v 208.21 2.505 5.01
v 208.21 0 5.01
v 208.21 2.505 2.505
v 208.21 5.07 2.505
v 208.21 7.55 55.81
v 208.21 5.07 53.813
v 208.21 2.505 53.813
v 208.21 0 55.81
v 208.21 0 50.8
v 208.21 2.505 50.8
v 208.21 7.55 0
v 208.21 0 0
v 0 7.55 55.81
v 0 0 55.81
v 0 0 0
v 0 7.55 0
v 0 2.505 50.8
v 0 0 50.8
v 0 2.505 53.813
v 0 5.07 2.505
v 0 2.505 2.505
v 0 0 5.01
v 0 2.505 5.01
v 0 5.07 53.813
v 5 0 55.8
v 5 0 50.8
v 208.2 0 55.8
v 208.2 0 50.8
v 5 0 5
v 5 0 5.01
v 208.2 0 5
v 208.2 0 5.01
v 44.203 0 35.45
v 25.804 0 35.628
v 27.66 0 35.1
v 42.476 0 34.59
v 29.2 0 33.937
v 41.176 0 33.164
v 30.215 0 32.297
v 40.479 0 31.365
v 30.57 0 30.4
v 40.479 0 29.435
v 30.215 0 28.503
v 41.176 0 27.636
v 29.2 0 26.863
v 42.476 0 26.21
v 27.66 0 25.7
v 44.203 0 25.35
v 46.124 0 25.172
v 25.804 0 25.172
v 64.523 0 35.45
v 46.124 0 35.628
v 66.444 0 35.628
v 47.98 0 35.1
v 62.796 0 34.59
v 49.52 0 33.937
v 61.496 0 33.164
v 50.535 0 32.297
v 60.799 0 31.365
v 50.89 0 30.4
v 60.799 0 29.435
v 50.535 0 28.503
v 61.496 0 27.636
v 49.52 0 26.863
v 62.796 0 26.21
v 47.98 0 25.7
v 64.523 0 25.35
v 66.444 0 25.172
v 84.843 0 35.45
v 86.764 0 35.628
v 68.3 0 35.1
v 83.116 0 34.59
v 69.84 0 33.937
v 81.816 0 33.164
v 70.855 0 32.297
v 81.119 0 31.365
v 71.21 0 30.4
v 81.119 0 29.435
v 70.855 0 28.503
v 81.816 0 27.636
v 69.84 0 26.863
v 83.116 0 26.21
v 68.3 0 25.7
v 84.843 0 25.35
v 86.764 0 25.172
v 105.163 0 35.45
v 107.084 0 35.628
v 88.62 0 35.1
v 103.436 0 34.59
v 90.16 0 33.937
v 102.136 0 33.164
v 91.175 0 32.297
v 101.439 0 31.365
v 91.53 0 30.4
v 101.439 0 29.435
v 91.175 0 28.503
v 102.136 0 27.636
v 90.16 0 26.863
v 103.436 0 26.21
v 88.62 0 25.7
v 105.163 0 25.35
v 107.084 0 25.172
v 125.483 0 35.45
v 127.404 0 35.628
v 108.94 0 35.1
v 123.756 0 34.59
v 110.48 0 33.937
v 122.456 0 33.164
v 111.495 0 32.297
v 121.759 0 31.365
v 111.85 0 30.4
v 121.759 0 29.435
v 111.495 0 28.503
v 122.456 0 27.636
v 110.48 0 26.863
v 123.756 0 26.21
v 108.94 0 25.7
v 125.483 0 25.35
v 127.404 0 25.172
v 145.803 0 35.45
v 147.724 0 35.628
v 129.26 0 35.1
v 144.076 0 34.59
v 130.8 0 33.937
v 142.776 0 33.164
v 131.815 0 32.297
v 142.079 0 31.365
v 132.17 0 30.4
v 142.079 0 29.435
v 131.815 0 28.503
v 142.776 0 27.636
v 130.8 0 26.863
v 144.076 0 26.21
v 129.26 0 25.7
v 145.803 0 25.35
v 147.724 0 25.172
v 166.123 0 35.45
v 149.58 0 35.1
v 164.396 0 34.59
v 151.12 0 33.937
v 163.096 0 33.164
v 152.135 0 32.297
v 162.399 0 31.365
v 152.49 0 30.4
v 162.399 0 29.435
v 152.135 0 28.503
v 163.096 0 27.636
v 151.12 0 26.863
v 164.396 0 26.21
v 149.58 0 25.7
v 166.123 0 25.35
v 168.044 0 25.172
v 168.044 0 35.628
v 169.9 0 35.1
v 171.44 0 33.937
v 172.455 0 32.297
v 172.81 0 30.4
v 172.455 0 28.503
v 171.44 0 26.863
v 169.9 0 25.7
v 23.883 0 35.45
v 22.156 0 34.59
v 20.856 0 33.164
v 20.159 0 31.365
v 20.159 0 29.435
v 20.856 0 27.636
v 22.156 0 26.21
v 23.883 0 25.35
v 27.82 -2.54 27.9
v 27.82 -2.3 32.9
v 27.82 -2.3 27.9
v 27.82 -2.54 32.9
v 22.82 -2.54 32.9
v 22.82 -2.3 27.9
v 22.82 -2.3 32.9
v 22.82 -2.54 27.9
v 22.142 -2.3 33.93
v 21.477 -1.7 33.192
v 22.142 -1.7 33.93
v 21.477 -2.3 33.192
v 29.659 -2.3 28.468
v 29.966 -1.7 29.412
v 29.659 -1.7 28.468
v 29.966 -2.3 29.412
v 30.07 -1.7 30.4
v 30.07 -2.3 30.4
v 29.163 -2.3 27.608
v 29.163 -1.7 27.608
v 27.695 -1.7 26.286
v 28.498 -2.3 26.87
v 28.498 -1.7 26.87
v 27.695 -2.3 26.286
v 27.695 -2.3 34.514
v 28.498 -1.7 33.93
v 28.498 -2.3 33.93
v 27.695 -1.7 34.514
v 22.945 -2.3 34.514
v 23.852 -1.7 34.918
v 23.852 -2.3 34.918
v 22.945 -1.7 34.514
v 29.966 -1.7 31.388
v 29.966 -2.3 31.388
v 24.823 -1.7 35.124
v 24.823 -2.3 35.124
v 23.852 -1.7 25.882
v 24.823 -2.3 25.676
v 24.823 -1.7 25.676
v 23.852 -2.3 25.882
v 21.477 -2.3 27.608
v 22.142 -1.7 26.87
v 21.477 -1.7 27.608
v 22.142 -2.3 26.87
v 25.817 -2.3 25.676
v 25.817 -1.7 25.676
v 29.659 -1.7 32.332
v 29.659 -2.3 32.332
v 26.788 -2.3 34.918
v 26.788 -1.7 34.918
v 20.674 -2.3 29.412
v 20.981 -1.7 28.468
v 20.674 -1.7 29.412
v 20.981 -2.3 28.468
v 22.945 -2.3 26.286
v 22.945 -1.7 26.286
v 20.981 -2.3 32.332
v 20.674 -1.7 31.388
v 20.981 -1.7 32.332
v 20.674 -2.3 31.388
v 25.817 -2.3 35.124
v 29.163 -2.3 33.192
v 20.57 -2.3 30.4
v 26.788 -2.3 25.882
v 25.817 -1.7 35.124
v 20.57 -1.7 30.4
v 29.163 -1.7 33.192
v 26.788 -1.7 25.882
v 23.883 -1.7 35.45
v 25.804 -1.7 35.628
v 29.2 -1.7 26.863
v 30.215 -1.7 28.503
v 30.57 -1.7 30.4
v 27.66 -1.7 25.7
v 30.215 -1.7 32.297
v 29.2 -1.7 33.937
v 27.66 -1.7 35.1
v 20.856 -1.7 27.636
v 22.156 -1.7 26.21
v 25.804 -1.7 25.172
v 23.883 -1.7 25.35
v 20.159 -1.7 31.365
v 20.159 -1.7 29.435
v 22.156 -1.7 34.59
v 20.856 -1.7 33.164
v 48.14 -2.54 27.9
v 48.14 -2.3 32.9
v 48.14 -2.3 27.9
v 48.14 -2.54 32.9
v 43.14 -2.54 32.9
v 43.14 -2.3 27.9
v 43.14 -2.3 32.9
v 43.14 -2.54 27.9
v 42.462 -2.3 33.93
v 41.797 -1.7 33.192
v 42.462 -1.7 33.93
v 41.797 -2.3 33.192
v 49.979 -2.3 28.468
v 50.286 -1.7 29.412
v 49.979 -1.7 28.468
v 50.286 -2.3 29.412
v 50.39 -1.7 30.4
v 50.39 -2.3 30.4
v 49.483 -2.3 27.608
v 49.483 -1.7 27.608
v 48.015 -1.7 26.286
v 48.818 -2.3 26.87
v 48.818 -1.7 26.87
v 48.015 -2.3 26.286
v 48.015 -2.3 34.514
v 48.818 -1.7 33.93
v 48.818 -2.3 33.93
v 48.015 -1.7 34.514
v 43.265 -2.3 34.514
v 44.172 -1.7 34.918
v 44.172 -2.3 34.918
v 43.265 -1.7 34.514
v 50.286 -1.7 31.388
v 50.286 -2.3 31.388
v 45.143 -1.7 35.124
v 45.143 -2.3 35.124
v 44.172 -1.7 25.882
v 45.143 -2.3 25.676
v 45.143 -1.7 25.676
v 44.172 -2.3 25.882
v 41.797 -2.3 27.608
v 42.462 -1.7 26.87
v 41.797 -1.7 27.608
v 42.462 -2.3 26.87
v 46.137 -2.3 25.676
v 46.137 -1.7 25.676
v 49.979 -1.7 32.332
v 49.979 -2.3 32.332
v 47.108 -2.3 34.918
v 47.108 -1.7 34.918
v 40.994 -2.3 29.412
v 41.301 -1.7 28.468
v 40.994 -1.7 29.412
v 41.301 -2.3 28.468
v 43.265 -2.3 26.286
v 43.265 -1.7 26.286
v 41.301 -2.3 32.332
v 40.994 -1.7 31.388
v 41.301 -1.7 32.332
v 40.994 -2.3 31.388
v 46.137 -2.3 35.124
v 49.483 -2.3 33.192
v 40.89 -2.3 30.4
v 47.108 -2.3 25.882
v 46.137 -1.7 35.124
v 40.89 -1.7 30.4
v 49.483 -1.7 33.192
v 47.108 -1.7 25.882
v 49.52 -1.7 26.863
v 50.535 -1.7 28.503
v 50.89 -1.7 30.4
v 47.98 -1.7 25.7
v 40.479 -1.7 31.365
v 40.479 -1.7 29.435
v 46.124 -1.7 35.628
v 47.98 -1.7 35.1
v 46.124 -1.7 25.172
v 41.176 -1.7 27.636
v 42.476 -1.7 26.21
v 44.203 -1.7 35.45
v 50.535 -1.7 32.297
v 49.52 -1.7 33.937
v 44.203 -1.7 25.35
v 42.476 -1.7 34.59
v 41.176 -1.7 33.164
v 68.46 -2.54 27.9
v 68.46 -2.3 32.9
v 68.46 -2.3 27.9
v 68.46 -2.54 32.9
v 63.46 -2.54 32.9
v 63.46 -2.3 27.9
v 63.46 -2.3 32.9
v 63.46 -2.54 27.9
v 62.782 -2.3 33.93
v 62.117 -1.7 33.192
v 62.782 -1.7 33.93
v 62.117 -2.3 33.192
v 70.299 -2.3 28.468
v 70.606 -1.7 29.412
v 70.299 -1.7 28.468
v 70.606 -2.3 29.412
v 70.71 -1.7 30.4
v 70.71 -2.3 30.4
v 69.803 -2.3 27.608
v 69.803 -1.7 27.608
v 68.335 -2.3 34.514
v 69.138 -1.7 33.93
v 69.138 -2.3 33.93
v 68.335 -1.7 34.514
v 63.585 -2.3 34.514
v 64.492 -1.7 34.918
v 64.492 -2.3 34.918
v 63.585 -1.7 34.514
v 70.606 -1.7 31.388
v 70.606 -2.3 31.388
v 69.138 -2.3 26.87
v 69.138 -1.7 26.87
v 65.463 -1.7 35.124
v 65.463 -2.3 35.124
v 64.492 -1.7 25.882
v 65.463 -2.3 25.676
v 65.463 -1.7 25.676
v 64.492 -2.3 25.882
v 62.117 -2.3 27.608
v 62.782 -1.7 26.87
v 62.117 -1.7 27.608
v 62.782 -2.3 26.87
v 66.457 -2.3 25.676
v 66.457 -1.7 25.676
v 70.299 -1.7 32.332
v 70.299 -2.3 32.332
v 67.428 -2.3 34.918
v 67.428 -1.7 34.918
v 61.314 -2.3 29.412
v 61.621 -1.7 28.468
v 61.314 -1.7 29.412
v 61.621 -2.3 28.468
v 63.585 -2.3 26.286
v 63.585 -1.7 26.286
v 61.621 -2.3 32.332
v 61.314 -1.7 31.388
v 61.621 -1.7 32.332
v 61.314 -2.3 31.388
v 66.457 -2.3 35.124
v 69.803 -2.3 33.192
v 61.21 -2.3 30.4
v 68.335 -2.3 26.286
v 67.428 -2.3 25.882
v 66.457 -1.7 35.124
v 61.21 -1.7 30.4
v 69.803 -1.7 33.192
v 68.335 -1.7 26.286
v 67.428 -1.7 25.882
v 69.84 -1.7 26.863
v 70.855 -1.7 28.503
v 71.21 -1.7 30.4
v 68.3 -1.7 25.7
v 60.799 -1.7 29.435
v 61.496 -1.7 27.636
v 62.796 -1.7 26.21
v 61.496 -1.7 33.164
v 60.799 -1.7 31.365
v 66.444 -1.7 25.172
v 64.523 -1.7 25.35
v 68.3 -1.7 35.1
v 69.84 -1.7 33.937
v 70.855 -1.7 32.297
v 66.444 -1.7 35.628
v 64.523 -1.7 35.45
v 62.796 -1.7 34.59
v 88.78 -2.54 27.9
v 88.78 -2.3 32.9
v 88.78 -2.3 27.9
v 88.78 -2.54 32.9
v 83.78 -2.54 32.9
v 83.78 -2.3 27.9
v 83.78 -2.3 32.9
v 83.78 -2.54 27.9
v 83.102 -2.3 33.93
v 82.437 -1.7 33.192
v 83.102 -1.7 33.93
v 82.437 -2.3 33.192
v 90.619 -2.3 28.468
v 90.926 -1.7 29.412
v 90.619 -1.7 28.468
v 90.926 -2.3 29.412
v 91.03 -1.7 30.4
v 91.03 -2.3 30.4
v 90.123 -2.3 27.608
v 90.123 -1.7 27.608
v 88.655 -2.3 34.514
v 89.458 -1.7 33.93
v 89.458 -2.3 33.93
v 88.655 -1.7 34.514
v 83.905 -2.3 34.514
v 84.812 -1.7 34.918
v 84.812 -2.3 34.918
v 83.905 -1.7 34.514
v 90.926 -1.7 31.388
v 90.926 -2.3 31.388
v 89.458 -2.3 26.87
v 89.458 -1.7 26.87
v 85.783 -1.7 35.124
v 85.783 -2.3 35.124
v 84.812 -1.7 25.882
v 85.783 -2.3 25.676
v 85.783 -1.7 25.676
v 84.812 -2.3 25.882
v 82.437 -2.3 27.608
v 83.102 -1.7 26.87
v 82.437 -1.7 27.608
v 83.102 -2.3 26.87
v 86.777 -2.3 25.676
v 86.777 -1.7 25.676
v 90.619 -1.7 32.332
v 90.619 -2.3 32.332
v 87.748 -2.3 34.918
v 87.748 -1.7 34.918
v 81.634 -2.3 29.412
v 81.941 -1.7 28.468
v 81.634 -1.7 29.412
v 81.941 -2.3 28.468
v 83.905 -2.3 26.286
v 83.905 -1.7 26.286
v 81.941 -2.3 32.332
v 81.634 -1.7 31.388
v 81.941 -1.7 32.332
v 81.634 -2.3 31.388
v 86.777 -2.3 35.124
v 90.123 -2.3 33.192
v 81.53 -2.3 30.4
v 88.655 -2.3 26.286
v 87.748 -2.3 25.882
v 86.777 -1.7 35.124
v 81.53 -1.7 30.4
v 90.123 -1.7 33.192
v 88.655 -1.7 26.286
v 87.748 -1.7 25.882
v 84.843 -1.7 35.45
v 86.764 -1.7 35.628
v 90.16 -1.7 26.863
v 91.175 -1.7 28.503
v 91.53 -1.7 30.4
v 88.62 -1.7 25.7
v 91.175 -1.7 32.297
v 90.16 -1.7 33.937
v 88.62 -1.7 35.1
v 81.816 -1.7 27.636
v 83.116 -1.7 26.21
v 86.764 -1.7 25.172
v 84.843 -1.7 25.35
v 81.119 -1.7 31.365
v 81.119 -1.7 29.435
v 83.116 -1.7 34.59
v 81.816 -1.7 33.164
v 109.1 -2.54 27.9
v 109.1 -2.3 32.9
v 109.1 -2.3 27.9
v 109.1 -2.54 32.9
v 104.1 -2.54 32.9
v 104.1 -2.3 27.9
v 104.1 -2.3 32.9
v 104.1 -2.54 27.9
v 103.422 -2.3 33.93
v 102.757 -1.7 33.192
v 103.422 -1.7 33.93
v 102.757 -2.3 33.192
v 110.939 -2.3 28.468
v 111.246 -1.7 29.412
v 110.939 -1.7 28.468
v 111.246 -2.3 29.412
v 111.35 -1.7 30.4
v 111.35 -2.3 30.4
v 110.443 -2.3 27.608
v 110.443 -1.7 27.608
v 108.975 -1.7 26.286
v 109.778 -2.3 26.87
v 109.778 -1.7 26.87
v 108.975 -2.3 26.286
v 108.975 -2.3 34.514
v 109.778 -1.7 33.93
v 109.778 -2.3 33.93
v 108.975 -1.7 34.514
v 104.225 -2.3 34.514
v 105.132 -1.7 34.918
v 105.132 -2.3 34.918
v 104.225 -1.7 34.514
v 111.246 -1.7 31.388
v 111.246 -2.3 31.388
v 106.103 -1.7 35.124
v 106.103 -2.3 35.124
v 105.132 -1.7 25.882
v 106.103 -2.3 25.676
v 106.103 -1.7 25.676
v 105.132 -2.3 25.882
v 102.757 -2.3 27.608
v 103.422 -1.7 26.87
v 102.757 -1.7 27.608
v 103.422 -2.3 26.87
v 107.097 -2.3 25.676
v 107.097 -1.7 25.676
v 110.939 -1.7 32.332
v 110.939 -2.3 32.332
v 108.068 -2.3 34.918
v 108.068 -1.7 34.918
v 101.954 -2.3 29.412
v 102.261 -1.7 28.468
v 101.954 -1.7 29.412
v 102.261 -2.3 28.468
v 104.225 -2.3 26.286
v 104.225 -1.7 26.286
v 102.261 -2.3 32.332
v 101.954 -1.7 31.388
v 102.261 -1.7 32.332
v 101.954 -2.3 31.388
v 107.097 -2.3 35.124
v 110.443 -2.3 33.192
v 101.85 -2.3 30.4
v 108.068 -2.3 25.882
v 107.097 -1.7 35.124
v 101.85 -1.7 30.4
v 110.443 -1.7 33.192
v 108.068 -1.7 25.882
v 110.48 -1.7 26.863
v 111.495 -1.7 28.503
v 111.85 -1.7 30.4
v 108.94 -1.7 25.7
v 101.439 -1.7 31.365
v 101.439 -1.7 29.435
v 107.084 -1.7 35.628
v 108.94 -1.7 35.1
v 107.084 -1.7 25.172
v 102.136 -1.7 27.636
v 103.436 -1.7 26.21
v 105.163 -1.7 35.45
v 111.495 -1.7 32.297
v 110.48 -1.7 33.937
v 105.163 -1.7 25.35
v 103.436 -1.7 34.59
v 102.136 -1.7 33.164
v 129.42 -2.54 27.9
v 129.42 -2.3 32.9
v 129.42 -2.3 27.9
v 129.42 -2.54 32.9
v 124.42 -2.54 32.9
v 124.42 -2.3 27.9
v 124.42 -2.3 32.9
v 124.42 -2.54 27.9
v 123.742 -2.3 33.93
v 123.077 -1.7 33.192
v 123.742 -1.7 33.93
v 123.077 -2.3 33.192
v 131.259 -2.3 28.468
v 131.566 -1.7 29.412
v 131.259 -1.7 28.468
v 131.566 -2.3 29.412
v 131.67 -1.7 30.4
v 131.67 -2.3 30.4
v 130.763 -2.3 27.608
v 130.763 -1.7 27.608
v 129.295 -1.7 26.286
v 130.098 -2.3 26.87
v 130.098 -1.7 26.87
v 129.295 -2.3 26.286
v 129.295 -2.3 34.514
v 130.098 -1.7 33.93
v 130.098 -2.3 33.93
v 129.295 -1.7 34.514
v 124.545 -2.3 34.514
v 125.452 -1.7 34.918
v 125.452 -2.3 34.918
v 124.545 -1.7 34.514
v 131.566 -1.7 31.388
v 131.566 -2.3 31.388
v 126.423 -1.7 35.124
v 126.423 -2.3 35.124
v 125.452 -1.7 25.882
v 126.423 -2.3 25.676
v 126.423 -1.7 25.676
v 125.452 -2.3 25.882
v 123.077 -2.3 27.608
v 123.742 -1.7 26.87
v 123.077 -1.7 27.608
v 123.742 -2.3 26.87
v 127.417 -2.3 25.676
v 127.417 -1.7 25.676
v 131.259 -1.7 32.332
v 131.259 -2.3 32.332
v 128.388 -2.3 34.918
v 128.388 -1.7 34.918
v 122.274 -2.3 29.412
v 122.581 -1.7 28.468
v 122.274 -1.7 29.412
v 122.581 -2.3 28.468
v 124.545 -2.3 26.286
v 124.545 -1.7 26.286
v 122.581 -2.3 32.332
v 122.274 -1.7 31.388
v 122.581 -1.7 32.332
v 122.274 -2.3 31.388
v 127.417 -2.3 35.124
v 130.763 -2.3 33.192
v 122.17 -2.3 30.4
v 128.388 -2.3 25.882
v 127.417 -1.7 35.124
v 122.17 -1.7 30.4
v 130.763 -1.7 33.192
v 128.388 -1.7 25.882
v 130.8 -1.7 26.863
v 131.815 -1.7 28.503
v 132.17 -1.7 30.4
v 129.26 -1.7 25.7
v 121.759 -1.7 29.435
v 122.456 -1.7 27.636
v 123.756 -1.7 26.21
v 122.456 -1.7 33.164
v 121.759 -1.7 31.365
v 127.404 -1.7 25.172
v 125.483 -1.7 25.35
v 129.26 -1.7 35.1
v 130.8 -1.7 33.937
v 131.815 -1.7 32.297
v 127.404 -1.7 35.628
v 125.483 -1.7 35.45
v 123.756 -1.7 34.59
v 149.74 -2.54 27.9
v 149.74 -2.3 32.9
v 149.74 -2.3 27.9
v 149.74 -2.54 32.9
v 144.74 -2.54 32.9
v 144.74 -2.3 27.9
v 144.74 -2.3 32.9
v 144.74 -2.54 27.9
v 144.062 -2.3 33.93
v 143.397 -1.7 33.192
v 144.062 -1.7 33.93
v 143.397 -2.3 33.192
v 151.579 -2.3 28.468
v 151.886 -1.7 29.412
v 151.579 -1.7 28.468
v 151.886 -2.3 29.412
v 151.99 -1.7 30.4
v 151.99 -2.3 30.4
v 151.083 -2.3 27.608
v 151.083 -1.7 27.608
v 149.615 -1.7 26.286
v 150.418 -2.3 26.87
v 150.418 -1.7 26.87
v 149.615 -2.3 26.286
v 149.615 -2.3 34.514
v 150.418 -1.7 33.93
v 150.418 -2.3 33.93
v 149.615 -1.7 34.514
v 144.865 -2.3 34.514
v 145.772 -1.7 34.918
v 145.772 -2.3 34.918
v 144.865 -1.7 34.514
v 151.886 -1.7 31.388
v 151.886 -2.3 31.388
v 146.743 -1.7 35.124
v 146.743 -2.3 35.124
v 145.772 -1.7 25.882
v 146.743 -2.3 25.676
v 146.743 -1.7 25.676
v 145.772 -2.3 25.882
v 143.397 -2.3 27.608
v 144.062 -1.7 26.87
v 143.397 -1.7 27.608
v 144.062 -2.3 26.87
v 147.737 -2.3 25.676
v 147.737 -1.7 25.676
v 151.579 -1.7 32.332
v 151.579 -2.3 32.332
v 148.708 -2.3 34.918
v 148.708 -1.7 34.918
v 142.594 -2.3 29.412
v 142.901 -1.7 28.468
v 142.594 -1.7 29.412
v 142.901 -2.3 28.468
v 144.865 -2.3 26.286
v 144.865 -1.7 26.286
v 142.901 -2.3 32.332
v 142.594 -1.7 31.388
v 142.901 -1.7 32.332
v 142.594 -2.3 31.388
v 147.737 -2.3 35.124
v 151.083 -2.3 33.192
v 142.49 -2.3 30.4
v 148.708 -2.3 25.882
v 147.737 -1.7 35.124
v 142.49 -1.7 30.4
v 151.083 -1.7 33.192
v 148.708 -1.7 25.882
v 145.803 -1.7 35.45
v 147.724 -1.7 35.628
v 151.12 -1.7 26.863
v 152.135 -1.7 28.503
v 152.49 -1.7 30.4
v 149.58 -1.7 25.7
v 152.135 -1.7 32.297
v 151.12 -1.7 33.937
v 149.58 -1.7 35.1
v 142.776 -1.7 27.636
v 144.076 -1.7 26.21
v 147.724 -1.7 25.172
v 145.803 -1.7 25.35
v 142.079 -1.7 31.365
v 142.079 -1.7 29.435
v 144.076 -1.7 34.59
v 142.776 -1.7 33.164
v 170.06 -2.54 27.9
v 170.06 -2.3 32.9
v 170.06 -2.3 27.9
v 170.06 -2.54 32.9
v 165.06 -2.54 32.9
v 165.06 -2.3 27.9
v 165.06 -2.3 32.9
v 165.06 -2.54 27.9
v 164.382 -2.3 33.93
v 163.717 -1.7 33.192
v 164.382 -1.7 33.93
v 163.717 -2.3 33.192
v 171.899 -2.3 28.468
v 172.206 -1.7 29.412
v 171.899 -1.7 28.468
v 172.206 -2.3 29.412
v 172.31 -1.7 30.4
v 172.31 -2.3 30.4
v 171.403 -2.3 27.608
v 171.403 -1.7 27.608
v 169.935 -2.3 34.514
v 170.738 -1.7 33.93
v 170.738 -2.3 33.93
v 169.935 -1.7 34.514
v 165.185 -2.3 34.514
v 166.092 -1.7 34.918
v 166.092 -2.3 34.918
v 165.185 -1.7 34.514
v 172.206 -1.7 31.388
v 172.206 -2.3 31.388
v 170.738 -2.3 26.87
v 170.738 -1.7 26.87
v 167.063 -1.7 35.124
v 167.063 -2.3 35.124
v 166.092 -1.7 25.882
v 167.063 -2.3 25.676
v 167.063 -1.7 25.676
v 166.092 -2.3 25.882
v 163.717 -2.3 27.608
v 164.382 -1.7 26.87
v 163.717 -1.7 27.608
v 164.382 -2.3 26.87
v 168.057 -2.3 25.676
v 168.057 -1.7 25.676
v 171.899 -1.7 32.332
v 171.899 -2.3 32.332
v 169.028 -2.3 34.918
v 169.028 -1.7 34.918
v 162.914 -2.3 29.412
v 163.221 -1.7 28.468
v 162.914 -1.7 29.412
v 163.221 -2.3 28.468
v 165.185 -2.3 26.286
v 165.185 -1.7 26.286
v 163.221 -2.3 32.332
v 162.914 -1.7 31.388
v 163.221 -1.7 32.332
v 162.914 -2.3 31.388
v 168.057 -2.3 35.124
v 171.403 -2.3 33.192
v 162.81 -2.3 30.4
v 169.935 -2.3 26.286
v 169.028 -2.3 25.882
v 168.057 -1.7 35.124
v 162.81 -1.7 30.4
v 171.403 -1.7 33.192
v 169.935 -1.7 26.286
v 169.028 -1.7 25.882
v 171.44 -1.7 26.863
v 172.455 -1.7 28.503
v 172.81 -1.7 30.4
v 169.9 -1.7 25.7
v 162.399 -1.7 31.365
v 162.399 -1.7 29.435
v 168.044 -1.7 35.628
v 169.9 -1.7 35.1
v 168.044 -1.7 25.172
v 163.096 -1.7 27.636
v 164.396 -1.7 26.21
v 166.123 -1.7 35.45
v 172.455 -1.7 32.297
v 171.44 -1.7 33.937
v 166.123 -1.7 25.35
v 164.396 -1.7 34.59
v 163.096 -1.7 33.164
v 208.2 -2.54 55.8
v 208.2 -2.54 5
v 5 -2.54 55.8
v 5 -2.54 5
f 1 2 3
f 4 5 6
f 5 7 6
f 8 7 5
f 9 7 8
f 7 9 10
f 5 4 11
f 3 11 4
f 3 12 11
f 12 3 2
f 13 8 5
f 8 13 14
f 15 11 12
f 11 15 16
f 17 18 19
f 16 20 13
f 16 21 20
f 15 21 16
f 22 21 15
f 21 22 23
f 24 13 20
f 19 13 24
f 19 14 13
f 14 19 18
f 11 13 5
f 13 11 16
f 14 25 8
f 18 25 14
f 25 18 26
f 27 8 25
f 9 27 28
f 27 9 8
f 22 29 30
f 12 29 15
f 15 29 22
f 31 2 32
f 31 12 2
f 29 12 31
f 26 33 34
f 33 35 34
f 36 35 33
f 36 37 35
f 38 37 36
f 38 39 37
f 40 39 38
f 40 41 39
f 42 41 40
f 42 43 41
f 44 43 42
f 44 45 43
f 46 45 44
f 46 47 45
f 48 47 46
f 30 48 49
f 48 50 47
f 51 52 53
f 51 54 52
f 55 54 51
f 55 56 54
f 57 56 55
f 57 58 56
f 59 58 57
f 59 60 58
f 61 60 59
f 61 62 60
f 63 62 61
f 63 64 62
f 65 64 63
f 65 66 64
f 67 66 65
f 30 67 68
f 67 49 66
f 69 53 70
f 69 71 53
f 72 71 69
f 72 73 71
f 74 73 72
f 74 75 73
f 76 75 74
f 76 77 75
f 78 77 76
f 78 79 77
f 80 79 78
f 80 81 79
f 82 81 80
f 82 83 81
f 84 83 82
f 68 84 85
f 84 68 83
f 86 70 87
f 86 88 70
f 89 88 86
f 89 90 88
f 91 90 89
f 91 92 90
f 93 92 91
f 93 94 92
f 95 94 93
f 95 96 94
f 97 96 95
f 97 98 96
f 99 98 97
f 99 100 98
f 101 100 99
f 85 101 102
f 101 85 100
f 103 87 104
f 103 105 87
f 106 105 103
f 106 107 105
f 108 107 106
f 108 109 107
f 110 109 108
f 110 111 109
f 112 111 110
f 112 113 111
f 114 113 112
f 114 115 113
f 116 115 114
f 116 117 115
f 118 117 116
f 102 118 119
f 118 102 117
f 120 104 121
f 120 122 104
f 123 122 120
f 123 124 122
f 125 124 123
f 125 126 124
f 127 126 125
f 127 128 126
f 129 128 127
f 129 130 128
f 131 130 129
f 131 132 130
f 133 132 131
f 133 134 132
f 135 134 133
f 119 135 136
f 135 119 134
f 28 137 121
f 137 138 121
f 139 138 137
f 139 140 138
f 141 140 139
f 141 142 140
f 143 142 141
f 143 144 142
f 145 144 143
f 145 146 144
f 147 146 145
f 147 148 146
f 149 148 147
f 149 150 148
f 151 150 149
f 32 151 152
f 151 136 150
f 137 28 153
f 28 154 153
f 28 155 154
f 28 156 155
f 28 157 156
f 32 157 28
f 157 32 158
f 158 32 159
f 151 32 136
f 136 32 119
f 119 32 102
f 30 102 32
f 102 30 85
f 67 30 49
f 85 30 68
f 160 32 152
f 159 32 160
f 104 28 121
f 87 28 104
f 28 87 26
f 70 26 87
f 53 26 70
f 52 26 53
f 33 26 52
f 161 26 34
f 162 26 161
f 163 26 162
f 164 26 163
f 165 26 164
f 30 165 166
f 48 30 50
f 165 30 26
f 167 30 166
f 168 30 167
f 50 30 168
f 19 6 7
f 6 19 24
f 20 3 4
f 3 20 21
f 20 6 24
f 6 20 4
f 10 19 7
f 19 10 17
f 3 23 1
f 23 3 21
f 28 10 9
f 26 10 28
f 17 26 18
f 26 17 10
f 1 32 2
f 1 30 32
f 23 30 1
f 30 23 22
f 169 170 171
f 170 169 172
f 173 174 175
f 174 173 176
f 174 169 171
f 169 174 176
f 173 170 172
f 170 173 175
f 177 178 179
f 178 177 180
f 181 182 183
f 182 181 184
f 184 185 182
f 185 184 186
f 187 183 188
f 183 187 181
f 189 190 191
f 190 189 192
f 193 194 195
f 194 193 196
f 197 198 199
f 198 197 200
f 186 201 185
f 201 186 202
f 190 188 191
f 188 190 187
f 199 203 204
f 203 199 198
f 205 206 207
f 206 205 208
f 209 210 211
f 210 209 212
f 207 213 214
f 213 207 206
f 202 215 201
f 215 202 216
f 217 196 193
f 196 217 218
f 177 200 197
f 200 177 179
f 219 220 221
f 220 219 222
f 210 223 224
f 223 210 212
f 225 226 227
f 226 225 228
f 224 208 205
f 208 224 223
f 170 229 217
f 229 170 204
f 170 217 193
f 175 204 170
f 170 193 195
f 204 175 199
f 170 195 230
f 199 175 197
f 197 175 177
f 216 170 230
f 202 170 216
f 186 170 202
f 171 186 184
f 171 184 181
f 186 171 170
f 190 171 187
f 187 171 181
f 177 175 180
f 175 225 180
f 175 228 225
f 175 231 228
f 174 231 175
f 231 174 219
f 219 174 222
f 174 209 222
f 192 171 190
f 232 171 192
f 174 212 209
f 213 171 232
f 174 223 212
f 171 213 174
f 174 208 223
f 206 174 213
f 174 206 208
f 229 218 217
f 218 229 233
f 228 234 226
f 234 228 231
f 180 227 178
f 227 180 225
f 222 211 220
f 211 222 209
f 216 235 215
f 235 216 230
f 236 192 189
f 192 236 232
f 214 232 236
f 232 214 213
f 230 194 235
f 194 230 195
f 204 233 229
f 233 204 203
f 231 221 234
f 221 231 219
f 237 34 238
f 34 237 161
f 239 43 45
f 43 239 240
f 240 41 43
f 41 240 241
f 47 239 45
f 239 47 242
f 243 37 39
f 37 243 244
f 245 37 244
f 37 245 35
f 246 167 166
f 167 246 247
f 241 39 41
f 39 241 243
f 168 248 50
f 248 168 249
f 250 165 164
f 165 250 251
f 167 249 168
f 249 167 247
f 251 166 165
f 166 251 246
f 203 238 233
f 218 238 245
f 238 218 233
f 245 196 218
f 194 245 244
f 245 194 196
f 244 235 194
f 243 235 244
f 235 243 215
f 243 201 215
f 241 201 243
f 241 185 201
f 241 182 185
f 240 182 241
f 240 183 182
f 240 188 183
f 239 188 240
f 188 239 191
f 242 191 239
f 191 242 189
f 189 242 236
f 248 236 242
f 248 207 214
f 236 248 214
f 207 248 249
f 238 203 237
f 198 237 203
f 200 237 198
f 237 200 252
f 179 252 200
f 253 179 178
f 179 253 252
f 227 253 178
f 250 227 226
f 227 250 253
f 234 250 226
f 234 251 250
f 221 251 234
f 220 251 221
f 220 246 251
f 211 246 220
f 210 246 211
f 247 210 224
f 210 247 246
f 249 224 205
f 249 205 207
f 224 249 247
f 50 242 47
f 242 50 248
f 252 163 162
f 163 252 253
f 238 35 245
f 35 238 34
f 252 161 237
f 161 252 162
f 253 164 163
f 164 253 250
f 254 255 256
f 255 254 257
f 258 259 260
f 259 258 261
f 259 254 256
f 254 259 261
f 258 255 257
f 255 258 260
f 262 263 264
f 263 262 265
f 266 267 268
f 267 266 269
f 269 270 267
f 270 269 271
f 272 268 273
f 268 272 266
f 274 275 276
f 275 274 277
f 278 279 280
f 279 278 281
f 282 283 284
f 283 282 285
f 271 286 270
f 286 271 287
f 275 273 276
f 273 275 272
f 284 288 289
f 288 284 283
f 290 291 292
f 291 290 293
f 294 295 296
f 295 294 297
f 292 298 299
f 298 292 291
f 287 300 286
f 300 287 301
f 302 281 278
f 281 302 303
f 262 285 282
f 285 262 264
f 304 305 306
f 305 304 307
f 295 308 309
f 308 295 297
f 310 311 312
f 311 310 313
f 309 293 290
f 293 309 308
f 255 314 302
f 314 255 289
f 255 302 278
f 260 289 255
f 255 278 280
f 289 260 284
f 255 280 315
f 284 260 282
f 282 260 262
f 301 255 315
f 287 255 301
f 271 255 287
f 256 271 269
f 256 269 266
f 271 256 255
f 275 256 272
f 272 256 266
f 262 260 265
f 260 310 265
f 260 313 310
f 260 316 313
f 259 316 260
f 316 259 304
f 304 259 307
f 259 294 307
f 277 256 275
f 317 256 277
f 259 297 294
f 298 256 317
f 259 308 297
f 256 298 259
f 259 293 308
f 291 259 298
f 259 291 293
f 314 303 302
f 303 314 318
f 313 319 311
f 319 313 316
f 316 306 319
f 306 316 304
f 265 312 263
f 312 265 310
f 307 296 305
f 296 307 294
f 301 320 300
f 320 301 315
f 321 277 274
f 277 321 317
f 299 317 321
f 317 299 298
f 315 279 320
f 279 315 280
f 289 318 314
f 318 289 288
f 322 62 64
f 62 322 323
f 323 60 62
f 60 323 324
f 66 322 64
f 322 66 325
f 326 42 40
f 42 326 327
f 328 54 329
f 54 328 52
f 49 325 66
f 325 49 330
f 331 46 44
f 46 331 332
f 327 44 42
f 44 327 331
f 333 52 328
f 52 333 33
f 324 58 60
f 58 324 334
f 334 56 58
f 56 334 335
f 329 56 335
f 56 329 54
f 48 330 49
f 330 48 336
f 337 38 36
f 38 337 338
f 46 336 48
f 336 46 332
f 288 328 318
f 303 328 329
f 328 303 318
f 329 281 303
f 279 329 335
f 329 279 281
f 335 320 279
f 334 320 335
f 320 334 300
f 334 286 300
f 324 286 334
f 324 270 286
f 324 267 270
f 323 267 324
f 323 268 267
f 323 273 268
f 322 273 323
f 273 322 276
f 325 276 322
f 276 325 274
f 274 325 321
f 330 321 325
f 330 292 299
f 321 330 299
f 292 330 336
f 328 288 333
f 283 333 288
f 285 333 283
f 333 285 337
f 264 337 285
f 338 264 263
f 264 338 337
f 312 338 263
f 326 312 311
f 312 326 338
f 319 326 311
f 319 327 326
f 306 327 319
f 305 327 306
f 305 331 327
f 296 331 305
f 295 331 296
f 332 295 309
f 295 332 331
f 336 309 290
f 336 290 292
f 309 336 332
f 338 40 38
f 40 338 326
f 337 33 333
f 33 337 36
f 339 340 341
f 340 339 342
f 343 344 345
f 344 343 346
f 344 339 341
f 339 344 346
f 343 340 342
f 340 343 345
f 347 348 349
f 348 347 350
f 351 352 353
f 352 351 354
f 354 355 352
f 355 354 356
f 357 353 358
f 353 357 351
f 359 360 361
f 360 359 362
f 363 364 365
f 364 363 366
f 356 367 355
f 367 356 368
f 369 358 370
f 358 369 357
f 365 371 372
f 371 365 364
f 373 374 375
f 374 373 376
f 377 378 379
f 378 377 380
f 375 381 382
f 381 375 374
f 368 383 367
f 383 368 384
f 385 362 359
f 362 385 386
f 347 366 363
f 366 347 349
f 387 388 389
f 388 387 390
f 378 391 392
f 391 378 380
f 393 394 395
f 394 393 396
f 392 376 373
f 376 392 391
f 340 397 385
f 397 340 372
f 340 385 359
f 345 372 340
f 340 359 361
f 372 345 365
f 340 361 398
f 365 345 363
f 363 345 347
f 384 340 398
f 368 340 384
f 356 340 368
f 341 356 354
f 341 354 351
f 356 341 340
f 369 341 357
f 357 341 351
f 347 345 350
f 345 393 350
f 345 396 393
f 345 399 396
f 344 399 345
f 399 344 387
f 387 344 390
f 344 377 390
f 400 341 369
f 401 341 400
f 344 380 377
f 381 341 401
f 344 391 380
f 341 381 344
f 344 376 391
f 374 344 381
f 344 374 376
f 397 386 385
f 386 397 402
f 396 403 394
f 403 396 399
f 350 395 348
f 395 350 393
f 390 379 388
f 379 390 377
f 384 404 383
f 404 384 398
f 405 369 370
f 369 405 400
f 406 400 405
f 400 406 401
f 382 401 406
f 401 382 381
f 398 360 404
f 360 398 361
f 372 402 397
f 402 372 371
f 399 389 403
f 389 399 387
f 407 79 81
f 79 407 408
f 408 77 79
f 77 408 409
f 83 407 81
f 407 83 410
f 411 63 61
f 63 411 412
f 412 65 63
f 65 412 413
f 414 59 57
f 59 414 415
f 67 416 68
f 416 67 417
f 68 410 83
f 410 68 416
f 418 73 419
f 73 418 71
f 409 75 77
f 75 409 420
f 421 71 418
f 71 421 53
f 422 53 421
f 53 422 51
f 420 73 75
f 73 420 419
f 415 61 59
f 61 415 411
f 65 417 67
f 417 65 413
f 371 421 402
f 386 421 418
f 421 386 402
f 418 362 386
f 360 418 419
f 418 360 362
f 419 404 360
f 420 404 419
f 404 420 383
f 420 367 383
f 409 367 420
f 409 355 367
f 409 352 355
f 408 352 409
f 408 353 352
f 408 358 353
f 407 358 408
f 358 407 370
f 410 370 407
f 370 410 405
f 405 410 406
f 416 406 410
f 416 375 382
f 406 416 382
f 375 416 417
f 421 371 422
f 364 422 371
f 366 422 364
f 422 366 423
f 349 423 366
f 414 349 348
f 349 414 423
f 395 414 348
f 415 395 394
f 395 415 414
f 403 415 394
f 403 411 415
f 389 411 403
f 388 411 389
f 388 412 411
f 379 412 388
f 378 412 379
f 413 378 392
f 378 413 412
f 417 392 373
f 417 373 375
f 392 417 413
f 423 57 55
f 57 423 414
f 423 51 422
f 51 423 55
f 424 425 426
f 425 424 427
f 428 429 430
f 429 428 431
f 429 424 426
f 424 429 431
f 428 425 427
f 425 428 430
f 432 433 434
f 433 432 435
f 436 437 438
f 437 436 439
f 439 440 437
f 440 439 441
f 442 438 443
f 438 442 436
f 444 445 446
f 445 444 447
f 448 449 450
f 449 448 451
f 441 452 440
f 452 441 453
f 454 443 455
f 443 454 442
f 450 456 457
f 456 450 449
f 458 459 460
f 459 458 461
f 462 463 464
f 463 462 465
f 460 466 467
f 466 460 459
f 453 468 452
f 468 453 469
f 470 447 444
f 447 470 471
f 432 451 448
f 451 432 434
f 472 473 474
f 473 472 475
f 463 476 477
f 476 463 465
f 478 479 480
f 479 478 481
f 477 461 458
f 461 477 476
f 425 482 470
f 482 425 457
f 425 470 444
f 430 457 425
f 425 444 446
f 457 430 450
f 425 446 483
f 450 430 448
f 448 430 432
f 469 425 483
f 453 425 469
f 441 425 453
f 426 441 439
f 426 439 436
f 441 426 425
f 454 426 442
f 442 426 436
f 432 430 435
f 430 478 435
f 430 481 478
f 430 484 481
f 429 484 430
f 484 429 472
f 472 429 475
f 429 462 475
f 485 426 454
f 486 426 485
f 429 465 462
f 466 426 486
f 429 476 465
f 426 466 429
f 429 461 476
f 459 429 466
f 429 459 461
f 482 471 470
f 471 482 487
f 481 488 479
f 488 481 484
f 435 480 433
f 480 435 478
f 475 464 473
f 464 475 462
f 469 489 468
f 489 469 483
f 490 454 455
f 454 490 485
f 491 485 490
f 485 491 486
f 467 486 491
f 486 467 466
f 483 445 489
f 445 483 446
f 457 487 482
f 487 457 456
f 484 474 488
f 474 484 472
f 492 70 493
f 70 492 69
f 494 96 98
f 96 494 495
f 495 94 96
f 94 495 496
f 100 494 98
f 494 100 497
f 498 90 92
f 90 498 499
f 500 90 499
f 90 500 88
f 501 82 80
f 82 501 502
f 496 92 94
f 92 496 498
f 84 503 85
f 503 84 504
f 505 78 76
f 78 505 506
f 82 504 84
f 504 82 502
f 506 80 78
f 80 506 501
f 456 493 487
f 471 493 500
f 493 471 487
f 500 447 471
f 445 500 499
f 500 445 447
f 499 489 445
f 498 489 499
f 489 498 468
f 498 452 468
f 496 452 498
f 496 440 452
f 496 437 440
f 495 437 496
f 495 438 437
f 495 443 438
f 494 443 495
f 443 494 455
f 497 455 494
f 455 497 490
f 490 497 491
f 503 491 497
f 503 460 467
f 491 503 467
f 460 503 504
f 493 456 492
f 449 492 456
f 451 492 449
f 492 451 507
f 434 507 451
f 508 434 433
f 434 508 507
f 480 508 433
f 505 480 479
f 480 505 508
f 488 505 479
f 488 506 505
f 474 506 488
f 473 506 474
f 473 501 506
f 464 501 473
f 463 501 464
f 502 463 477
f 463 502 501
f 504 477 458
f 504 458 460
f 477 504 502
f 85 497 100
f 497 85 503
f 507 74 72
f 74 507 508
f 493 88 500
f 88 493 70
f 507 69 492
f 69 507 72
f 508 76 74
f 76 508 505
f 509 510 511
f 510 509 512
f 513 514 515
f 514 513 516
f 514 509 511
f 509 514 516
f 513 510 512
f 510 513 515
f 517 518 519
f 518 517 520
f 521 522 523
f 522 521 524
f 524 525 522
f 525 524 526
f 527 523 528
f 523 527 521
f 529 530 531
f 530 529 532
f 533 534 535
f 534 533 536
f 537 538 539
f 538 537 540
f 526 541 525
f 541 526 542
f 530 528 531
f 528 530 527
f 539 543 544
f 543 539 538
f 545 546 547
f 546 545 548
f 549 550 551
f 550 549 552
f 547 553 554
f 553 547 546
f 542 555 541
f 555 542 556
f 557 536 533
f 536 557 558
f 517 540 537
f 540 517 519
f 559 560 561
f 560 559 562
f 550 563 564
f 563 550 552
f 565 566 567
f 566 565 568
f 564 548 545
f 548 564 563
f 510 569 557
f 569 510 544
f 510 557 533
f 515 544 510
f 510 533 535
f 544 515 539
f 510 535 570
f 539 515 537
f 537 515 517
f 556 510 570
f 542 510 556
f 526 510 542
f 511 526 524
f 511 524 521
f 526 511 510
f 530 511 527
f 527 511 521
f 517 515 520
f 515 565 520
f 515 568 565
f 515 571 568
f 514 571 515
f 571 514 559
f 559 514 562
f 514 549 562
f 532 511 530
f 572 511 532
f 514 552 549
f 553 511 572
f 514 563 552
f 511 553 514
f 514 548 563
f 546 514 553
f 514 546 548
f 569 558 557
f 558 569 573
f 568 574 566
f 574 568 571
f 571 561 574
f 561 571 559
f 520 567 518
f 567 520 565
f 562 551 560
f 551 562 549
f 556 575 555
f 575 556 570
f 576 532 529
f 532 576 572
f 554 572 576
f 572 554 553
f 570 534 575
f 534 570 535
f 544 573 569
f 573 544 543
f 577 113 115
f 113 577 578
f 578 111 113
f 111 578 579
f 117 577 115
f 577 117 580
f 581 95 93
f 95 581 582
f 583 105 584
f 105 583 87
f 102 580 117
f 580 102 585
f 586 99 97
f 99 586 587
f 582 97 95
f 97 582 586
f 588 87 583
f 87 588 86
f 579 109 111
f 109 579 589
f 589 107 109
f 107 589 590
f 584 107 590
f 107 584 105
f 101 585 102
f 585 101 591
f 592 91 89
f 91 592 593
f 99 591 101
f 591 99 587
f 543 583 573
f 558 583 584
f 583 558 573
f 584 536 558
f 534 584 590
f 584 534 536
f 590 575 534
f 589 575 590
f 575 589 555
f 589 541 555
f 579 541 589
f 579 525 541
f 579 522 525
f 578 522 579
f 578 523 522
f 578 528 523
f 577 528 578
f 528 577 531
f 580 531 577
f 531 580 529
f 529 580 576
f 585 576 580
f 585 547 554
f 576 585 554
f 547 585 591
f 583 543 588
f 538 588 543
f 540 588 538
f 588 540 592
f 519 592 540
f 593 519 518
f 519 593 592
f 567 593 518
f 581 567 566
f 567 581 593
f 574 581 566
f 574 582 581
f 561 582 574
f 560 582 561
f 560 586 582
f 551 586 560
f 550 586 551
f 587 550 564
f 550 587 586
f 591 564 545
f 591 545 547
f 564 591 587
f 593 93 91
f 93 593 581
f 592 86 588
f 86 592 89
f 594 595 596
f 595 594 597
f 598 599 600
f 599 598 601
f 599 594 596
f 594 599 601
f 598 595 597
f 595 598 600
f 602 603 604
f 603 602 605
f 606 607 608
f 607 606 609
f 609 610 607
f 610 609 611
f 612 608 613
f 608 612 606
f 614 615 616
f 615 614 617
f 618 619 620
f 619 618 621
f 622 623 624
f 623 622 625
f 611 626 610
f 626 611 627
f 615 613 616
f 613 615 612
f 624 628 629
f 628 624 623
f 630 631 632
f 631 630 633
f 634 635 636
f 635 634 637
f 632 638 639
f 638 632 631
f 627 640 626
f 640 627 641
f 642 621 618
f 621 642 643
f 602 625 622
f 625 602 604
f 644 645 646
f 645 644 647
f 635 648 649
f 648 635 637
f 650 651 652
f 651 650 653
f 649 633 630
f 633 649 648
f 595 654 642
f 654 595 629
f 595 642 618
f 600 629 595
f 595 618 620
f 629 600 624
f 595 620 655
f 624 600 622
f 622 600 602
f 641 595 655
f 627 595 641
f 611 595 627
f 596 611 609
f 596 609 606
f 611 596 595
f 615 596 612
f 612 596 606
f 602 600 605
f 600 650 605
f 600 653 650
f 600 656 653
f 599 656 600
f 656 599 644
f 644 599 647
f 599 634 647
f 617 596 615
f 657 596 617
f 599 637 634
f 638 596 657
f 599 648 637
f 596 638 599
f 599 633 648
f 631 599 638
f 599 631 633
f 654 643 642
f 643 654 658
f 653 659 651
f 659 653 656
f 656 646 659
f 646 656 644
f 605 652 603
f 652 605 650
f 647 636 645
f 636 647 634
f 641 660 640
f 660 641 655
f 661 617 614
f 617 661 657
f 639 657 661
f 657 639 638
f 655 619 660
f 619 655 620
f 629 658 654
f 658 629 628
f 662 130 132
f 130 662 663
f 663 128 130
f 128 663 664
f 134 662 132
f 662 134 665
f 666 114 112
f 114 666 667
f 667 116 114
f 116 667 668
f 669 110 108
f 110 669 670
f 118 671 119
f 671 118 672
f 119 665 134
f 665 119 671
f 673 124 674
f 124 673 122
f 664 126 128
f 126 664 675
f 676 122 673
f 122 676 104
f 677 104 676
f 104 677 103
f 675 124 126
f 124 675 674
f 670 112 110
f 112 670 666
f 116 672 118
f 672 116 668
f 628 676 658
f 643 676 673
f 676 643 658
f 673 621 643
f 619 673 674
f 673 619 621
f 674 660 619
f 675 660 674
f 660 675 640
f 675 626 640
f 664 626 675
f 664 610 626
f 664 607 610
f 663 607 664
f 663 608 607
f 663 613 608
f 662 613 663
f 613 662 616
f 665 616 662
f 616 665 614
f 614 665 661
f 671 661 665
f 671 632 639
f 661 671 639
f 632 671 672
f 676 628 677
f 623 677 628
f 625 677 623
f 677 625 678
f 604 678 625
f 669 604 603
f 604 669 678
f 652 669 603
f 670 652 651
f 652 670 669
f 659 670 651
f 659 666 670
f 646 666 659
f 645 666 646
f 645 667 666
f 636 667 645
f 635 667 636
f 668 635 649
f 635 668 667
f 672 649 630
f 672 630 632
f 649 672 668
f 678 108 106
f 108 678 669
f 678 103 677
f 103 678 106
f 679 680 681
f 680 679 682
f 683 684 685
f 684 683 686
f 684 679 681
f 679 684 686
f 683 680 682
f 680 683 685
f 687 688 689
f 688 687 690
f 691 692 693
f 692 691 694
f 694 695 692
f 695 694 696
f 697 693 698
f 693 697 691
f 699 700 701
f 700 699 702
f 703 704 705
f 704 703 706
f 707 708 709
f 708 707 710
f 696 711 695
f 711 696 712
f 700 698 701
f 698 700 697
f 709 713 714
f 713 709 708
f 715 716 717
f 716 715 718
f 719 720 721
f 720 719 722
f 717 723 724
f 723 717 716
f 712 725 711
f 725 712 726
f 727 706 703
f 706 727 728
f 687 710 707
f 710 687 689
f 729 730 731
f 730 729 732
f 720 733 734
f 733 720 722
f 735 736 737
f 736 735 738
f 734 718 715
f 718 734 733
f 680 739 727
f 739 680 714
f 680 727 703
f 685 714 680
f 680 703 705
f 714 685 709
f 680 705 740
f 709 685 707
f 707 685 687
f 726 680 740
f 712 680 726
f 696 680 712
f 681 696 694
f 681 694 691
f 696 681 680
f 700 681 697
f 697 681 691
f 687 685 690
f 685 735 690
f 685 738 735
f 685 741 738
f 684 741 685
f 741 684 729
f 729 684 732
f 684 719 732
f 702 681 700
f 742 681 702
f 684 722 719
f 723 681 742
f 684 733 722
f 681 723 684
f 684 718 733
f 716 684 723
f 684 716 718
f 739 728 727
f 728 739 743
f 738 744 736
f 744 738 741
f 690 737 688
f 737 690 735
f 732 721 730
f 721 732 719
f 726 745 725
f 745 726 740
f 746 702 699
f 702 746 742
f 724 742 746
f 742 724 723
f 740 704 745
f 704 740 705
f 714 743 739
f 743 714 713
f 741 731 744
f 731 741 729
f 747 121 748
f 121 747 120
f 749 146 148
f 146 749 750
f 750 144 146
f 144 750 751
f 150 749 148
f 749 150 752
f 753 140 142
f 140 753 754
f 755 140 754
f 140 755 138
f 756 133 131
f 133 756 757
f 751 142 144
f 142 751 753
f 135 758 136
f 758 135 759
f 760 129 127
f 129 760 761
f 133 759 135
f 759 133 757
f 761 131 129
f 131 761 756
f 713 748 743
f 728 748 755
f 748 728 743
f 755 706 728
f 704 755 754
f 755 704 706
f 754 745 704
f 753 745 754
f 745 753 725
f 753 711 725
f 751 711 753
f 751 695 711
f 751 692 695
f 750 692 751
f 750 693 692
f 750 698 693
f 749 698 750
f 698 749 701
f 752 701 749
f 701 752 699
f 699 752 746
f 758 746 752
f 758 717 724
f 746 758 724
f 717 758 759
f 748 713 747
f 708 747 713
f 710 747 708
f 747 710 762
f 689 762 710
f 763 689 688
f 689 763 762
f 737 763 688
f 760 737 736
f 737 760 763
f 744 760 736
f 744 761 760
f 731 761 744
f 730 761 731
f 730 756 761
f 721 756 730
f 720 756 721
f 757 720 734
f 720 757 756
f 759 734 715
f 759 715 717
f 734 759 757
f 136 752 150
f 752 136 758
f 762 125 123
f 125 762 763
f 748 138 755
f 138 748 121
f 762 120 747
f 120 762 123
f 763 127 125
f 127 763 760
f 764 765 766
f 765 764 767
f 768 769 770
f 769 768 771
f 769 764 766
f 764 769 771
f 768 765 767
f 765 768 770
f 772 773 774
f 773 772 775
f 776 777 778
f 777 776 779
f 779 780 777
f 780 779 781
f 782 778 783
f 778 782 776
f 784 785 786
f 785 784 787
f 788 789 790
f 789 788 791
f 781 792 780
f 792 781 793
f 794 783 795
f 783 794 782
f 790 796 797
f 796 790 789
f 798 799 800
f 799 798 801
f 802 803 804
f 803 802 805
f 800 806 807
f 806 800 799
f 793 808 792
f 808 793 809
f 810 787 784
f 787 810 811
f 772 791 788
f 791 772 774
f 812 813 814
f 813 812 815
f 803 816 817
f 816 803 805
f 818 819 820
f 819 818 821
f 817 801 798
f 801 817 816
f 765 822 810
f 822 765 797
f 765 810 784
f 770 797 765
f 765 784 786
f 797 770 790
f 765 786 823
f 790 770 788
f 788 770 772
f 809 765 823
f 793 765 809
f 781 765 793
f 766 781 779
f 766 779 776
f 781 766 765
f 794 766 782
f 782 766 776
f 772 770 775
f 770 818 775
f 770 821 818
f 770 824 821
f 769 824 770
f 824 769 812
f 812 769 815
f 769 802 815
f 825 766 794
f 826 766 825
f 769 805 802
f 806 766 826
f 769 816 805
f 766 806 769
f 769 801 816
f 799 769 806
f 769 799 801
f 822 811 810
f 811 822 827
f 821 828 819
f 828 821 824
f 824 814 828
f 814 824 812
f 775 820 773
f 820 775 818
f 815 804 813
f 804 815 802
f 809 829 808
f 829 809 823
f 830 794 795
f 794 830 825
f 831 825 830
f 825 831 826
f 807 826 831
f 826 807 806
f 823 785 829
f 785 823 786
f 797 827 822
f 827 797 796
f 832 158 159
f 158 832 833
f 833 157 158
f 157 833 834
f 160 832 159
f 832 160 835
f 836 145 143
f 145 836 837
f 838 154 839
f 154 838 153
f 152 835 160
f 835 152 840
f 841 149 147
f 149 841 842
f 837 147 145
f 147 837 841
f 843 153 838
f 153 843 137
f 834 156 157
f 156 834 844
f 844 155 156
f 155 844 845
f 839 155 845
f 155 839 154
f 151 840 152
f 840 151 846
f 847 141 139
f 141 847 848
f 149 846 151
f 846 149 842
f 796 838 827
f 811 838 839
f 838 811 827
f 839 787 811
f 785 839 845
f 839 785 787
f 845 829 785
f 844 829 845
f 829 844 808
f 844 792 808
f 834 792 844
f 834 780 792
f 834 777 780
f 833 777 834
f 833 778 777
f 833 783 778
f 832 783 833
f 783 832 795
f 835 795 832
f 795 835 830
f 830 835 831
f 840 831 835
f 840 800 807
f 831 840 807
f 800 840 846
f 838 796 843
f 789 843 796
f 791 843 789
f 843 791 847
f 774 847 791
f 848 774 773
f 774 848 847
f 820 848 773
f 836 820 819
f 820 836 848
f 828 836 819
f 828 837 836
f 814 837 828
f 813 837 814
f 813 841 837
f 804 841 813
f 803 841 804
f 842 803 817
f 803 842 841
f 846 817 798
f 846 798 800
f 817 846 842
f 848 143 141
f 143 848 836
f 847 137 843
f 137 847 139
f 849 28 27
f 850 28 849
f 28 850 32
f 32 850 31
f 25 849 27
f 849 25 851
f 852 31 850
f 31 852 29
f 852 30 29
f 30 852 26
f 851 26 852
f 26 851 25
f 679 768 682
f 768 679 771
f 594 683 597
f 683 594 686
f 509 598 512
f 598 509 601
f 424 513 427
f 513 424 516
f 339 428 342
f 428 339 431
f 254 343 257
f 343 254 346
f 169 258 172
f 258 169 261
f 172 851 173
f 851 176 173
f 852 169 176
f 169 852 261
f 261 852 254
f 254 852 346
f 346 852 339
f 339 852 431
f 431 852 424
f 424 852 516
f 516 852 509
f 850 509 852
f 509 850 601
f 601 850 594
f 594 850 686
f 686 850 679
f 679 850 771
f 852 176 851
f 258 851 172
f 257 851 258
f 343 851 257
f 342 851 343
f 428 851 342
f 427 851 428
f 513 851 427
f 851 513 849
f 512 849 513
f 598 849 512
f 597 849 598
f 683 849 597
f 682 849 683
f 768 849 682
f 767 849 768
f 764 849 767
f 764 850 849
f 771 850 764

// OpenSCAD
// file: ../lib/neo_pixel.scad
///< Alitovo Neo pixel RGB X000UCVKBH 2812b-1-LED-WH
use <../lib/math.scad>;
use <../lib/utils.scad>;

///< Parameters - Begin
led_assembly_h = 2.8;
led_assembly_d = 9.5;

///< Diameter of the PCB 
pcb_d = 9.5;
pcb_h = 1.2;

///< Demensions of the LED IC
led_w = 5;
led_d = led_w;
led_h = led_assembly_h - pcb_h;


///< Modules
module pcb(){
     ///< LED PCB definition
     color( rand_clr() )cylinder( h=pcb_h, d=pcb_d, $fn = 30 );
}

module led(){
     ///< Neo pixel LED (2812b-1)
     union(){
         color( rand_clr() )cube( [ led_w, led_d, led_h ] );
         color( rand_clr() )
              translate([led_w/2,led_d/2, 0] )
              cylinder( h=led_h, d= led_w, $fn = 30 );
         }
}

module neo_pixel(){
     ///< Assembly of the led and pcb_pad
     union(){
          translate([-led_w/2,-led_d/2,pcb_h-0.01])led();
          pcb();
          }

}

///< Build object
///< Remove this when including
//neo_pixel();
// file: nameplate.scad
///< Nameplate
/*
https://en.wikipedia.org/wiki/Nameplate
Excerpt:  'Although office nameplates range in size, the most popular nameplate size is 2 by 8 inches (5.08 cm × 20.32 cm)'

*/
use <../lib/math.scad>;
use <../lib/utils.scad>;

///< Parameters
nameplate_w_inches = 8;
nameplate_h_inches = 2;
nameplate_d_inches = 0.10;

nameplate_w = in2mm( nameplate_w_inches );
nameplate_h = in2mm( nameplate_h_inches );
nameplate_d = in2mm( nameplate_d_inches );

nameplate_debug = false;

if( nameplate_debug ) {
     echo( "Nameplate width: ",  nameplate_w,  "mm" );
     echo( "Nameplate height: ", nameplate_h, "mm" );
     echo( "Nameplate depth: ",  nameplate_d,  "mm" );
}

nameplate = [ nameplate_w, nameplate_d, nameplate_h ];

///< Modules
module Nameplate( size, center = false ) {
     cube( size, center = center );
}
// file: led_frame.scad
///< LED frame for the neo pixel array
use <../lib/math.scad>;
use <../lib/utils.scad>;
include <../lib/neo_pixel.scad>

///< Parameters
pcb_socket_d = led_assembly_d + 1;
pcb_socket_h = 1.0;
num_leds     = 10;

led_frame_w  = 150;
led_frame_d  = led_assembly_h+pcb_socket_h;
led_frame_h  = pcb_socket_d+1.5;

///< Modules
module led_frame( width, depth, height ){
     //union(){
     difference(){
          cube( [width, depth, height] );
          led_spacing_w = width/( num_leds );

          ///< Make x number of slots
          for (i = [0:num_leds]){
               offset_spacing = (( i * led_spacing_w ) + ( led_spacing_w ));
               remaining = width - offset_spacing;
               if( remaining >= led_spacing_w ){
                    translate( [ offset_spacing, (pcb_socket_h+0.1), height/2 ] )
                         rotate( [ -90, 0, 0 ])
                         color( rand_clr() )
                         neo_pixel(h=pcb_h+0.1, d=pcb_socket_d);
                    translate( [ offset_spacing, -0.5, height/2 ] )
                        rotate( [ -90, 0, 0 ])
                        color( rand_clr() )
                        cylinder( h=pcb_h+pcb_socket_h, d = pcb_socket_d );
               }
          }
     }
}

///< Build object
//echo( "Led_Frame height:",
//      led_frame_h,
//      "depth:",
//      led_frame_d,
//      "width:",
//      led_frame_w );
//led_frame( led_frame_w, led_frame_d, led_frame_h );
// file: frame.scad
///< Object definition
use <../lib/math.scad>;
use <../lib/utils.scad>;
include <nameplate.scad>

///< Parameters
module frame( w, d, h, pad = 5, show_nameplate = false ){

     ///< Frame demensions
     frame_clearance = 0.01;
     frame_p = pad + frame_clearance; //< Padding
     frame_w = w + frame_p;
     frame_d = d + frame_p;
     frame_h = h + frame_p;

     frame = [ frame_w, frame_d, frame_h ];
     frame_inset = [0, frame_p/2, frame_p/2 ];
     frame_view  = [0, 0,         frame_p ];

     nameplate_cut = [ ( frame_w + ( frame_p * 2.0 ) ) * 1.01,
		     d * 1.01,
		     h * 1.01 ];

     view_w = frame_w;
     view_d = d;
     view_h = h - ( frame_p);
     view_cut = [ view_w, view_d, view_h ];

     if( show_nameplate ){
	  echo( nameplate );
	  color( rand_clr() )
	       translate( frame_inset ){ Nameplate( nameplate ); }
     }

     ///< Holder
     difference(){
	  color( rand_clr() )cube( frame );
	  color( rand_clr() )
	       translate( frame_inset )
	       Nameplate( nameplate_cut );
	  color( rand_clr() )
	       translate( frame_view )
	       cube( view_cut );
     }
}

///< Build object
//echo( nameplate_w, nameplate_d, nameplate_h  );
//frame( nameplate_w, nameplate_d, nameplate_h  );
// file: ../lib/utils.scad
///< Utilities

function rand_clr() = rands( 0,1,3 );

///< Length conversions
function in2mm( i ) = ( i * 25.4 ); 
function mm2in( m ) = ( m / 25.4 );

/// This is pulled from stackoverflow
/// https://stackoverflow.com/questions/45826208/openscad-rotating-around-a-particular-point

// rotate as per a, v, but around point pt
module rotate_about_pt(a, v, pt) {
    translate(pt)
        rotate(a,v)
            translate(-pt)
                children();   
}

function adjust_z_offset( v, z ) = [for (i=[0:(len(v)-1)]) v[i]+[0,0,z]] ;

///< For each child, translate child by <p> point in points
module foreach_translate(points ){
	for (p=points){
		translate(p) children();
	}
}
// file: ../lib/math.scad
///< Math scad module


///< Find the hypotenuse from two sides of a right triangle
function hyp_from_sides( a, b ) = sqrt( pow( a, 2 ) + pow( b, 2 ) );

///< Find equal sides from hypotenuse of a right triangle
function sides_from_hyp(h) = sqrt( pow( h, 2 ) / 2 );

///< Find A from hypotenuse and B
function a_from_hb( h, b ) = sqrt( pow( h, 2 ) - pow( b, 2 ) );

function dist_2d( pt2, pt1 ) = sqrt(pow(( pt2[0]-pt1[0] ),2) + pow(( pt2[1]-pt1[1]),2) );

function mid_pt_2d( pt2, pt1 ) = [( pt1[0]+pt2[0] )/2, ( pt1[1]+pt2[1] )/2, 0 ];

function opposite_side_th( theta, hypotenuse ) = sin( theta )*hypotenuse ;
function adjacent_side_th( theta, hypotenuse ) = cos( theta )*hypotenuse ;

///< Test for math functions

A = 3;
B = 4;
echo("Given A=", A, "and B=", B );
H = hyp_from_sides( A, B );
echo("Hypotenuse=", H );
echo("Calc Correct = ", (H == 5) );

echo("Given H=", H, " which is a hypotenuse with equal sides" );
echo( "the sides=", sides_from_hyp( H ) );

echo("Given H=", H, "B=", 4 );
echo("A=", a_from_hb( H, 4 ) );

echo("Distance from [-1,1] and [3,4] = ", dist_2d( [-1,1],[3,4]) );

echo( "Opposite = ", opposite_side_th( 39.0, 30 ), "Theta = ", 39.0, "Hypotenuse = ", 30 );
echo( "Adjacent = ", adjacent_side_th( 60.0, 10 ), "Theta = ", 60.0, "Hypotenuse = ", 10 );

///< Find the sum of a vector <vect> starting from <s> and continuing to <i>
function sumv( vect, i, s=0 ) = ( i == s ? vect[ i ] : vect[ i ] + sumv( vect, i - 1, s ) );
vec = [ 1, 2, 3, 4 ];
l = len( vec )-1;
echo( "Sum vec = ", sumv( vec, l, 0 ) );

///< Find the average of a vector <vect> starting at <s>
function average( vect, s=0 ) = (len( vect ) == 0 ? 0 : ( sumv( vect, len( vect ) - 1, s )/len(vect) ) );
echo( "Ave vec = ", average( vec ) );
vec2 = [];
echo( "Ave vec2 = ", average( vec2 ) );
// main file
///< Object definition
use <../lib/math.scad>;
use <../lib/utils.scad>;

///< Models
use <frame.scad>;
use <led_frame.scad>;

///< Imported parameters
include <nameplate.scad>;

///< Parameters
w = nameplate_w;
d = nameplate_d;
h = nameplate_h;

///< Build object
module assembly(){
translate( [ 0, 0, 0 ] )frame( w, d, h );
color( rand_clr() )
     mirror( [ 0, 1, 0 ] )
     translate( [ 5, 0, 5 ] )
     led_frame( w, d, h );
}

assembly();
